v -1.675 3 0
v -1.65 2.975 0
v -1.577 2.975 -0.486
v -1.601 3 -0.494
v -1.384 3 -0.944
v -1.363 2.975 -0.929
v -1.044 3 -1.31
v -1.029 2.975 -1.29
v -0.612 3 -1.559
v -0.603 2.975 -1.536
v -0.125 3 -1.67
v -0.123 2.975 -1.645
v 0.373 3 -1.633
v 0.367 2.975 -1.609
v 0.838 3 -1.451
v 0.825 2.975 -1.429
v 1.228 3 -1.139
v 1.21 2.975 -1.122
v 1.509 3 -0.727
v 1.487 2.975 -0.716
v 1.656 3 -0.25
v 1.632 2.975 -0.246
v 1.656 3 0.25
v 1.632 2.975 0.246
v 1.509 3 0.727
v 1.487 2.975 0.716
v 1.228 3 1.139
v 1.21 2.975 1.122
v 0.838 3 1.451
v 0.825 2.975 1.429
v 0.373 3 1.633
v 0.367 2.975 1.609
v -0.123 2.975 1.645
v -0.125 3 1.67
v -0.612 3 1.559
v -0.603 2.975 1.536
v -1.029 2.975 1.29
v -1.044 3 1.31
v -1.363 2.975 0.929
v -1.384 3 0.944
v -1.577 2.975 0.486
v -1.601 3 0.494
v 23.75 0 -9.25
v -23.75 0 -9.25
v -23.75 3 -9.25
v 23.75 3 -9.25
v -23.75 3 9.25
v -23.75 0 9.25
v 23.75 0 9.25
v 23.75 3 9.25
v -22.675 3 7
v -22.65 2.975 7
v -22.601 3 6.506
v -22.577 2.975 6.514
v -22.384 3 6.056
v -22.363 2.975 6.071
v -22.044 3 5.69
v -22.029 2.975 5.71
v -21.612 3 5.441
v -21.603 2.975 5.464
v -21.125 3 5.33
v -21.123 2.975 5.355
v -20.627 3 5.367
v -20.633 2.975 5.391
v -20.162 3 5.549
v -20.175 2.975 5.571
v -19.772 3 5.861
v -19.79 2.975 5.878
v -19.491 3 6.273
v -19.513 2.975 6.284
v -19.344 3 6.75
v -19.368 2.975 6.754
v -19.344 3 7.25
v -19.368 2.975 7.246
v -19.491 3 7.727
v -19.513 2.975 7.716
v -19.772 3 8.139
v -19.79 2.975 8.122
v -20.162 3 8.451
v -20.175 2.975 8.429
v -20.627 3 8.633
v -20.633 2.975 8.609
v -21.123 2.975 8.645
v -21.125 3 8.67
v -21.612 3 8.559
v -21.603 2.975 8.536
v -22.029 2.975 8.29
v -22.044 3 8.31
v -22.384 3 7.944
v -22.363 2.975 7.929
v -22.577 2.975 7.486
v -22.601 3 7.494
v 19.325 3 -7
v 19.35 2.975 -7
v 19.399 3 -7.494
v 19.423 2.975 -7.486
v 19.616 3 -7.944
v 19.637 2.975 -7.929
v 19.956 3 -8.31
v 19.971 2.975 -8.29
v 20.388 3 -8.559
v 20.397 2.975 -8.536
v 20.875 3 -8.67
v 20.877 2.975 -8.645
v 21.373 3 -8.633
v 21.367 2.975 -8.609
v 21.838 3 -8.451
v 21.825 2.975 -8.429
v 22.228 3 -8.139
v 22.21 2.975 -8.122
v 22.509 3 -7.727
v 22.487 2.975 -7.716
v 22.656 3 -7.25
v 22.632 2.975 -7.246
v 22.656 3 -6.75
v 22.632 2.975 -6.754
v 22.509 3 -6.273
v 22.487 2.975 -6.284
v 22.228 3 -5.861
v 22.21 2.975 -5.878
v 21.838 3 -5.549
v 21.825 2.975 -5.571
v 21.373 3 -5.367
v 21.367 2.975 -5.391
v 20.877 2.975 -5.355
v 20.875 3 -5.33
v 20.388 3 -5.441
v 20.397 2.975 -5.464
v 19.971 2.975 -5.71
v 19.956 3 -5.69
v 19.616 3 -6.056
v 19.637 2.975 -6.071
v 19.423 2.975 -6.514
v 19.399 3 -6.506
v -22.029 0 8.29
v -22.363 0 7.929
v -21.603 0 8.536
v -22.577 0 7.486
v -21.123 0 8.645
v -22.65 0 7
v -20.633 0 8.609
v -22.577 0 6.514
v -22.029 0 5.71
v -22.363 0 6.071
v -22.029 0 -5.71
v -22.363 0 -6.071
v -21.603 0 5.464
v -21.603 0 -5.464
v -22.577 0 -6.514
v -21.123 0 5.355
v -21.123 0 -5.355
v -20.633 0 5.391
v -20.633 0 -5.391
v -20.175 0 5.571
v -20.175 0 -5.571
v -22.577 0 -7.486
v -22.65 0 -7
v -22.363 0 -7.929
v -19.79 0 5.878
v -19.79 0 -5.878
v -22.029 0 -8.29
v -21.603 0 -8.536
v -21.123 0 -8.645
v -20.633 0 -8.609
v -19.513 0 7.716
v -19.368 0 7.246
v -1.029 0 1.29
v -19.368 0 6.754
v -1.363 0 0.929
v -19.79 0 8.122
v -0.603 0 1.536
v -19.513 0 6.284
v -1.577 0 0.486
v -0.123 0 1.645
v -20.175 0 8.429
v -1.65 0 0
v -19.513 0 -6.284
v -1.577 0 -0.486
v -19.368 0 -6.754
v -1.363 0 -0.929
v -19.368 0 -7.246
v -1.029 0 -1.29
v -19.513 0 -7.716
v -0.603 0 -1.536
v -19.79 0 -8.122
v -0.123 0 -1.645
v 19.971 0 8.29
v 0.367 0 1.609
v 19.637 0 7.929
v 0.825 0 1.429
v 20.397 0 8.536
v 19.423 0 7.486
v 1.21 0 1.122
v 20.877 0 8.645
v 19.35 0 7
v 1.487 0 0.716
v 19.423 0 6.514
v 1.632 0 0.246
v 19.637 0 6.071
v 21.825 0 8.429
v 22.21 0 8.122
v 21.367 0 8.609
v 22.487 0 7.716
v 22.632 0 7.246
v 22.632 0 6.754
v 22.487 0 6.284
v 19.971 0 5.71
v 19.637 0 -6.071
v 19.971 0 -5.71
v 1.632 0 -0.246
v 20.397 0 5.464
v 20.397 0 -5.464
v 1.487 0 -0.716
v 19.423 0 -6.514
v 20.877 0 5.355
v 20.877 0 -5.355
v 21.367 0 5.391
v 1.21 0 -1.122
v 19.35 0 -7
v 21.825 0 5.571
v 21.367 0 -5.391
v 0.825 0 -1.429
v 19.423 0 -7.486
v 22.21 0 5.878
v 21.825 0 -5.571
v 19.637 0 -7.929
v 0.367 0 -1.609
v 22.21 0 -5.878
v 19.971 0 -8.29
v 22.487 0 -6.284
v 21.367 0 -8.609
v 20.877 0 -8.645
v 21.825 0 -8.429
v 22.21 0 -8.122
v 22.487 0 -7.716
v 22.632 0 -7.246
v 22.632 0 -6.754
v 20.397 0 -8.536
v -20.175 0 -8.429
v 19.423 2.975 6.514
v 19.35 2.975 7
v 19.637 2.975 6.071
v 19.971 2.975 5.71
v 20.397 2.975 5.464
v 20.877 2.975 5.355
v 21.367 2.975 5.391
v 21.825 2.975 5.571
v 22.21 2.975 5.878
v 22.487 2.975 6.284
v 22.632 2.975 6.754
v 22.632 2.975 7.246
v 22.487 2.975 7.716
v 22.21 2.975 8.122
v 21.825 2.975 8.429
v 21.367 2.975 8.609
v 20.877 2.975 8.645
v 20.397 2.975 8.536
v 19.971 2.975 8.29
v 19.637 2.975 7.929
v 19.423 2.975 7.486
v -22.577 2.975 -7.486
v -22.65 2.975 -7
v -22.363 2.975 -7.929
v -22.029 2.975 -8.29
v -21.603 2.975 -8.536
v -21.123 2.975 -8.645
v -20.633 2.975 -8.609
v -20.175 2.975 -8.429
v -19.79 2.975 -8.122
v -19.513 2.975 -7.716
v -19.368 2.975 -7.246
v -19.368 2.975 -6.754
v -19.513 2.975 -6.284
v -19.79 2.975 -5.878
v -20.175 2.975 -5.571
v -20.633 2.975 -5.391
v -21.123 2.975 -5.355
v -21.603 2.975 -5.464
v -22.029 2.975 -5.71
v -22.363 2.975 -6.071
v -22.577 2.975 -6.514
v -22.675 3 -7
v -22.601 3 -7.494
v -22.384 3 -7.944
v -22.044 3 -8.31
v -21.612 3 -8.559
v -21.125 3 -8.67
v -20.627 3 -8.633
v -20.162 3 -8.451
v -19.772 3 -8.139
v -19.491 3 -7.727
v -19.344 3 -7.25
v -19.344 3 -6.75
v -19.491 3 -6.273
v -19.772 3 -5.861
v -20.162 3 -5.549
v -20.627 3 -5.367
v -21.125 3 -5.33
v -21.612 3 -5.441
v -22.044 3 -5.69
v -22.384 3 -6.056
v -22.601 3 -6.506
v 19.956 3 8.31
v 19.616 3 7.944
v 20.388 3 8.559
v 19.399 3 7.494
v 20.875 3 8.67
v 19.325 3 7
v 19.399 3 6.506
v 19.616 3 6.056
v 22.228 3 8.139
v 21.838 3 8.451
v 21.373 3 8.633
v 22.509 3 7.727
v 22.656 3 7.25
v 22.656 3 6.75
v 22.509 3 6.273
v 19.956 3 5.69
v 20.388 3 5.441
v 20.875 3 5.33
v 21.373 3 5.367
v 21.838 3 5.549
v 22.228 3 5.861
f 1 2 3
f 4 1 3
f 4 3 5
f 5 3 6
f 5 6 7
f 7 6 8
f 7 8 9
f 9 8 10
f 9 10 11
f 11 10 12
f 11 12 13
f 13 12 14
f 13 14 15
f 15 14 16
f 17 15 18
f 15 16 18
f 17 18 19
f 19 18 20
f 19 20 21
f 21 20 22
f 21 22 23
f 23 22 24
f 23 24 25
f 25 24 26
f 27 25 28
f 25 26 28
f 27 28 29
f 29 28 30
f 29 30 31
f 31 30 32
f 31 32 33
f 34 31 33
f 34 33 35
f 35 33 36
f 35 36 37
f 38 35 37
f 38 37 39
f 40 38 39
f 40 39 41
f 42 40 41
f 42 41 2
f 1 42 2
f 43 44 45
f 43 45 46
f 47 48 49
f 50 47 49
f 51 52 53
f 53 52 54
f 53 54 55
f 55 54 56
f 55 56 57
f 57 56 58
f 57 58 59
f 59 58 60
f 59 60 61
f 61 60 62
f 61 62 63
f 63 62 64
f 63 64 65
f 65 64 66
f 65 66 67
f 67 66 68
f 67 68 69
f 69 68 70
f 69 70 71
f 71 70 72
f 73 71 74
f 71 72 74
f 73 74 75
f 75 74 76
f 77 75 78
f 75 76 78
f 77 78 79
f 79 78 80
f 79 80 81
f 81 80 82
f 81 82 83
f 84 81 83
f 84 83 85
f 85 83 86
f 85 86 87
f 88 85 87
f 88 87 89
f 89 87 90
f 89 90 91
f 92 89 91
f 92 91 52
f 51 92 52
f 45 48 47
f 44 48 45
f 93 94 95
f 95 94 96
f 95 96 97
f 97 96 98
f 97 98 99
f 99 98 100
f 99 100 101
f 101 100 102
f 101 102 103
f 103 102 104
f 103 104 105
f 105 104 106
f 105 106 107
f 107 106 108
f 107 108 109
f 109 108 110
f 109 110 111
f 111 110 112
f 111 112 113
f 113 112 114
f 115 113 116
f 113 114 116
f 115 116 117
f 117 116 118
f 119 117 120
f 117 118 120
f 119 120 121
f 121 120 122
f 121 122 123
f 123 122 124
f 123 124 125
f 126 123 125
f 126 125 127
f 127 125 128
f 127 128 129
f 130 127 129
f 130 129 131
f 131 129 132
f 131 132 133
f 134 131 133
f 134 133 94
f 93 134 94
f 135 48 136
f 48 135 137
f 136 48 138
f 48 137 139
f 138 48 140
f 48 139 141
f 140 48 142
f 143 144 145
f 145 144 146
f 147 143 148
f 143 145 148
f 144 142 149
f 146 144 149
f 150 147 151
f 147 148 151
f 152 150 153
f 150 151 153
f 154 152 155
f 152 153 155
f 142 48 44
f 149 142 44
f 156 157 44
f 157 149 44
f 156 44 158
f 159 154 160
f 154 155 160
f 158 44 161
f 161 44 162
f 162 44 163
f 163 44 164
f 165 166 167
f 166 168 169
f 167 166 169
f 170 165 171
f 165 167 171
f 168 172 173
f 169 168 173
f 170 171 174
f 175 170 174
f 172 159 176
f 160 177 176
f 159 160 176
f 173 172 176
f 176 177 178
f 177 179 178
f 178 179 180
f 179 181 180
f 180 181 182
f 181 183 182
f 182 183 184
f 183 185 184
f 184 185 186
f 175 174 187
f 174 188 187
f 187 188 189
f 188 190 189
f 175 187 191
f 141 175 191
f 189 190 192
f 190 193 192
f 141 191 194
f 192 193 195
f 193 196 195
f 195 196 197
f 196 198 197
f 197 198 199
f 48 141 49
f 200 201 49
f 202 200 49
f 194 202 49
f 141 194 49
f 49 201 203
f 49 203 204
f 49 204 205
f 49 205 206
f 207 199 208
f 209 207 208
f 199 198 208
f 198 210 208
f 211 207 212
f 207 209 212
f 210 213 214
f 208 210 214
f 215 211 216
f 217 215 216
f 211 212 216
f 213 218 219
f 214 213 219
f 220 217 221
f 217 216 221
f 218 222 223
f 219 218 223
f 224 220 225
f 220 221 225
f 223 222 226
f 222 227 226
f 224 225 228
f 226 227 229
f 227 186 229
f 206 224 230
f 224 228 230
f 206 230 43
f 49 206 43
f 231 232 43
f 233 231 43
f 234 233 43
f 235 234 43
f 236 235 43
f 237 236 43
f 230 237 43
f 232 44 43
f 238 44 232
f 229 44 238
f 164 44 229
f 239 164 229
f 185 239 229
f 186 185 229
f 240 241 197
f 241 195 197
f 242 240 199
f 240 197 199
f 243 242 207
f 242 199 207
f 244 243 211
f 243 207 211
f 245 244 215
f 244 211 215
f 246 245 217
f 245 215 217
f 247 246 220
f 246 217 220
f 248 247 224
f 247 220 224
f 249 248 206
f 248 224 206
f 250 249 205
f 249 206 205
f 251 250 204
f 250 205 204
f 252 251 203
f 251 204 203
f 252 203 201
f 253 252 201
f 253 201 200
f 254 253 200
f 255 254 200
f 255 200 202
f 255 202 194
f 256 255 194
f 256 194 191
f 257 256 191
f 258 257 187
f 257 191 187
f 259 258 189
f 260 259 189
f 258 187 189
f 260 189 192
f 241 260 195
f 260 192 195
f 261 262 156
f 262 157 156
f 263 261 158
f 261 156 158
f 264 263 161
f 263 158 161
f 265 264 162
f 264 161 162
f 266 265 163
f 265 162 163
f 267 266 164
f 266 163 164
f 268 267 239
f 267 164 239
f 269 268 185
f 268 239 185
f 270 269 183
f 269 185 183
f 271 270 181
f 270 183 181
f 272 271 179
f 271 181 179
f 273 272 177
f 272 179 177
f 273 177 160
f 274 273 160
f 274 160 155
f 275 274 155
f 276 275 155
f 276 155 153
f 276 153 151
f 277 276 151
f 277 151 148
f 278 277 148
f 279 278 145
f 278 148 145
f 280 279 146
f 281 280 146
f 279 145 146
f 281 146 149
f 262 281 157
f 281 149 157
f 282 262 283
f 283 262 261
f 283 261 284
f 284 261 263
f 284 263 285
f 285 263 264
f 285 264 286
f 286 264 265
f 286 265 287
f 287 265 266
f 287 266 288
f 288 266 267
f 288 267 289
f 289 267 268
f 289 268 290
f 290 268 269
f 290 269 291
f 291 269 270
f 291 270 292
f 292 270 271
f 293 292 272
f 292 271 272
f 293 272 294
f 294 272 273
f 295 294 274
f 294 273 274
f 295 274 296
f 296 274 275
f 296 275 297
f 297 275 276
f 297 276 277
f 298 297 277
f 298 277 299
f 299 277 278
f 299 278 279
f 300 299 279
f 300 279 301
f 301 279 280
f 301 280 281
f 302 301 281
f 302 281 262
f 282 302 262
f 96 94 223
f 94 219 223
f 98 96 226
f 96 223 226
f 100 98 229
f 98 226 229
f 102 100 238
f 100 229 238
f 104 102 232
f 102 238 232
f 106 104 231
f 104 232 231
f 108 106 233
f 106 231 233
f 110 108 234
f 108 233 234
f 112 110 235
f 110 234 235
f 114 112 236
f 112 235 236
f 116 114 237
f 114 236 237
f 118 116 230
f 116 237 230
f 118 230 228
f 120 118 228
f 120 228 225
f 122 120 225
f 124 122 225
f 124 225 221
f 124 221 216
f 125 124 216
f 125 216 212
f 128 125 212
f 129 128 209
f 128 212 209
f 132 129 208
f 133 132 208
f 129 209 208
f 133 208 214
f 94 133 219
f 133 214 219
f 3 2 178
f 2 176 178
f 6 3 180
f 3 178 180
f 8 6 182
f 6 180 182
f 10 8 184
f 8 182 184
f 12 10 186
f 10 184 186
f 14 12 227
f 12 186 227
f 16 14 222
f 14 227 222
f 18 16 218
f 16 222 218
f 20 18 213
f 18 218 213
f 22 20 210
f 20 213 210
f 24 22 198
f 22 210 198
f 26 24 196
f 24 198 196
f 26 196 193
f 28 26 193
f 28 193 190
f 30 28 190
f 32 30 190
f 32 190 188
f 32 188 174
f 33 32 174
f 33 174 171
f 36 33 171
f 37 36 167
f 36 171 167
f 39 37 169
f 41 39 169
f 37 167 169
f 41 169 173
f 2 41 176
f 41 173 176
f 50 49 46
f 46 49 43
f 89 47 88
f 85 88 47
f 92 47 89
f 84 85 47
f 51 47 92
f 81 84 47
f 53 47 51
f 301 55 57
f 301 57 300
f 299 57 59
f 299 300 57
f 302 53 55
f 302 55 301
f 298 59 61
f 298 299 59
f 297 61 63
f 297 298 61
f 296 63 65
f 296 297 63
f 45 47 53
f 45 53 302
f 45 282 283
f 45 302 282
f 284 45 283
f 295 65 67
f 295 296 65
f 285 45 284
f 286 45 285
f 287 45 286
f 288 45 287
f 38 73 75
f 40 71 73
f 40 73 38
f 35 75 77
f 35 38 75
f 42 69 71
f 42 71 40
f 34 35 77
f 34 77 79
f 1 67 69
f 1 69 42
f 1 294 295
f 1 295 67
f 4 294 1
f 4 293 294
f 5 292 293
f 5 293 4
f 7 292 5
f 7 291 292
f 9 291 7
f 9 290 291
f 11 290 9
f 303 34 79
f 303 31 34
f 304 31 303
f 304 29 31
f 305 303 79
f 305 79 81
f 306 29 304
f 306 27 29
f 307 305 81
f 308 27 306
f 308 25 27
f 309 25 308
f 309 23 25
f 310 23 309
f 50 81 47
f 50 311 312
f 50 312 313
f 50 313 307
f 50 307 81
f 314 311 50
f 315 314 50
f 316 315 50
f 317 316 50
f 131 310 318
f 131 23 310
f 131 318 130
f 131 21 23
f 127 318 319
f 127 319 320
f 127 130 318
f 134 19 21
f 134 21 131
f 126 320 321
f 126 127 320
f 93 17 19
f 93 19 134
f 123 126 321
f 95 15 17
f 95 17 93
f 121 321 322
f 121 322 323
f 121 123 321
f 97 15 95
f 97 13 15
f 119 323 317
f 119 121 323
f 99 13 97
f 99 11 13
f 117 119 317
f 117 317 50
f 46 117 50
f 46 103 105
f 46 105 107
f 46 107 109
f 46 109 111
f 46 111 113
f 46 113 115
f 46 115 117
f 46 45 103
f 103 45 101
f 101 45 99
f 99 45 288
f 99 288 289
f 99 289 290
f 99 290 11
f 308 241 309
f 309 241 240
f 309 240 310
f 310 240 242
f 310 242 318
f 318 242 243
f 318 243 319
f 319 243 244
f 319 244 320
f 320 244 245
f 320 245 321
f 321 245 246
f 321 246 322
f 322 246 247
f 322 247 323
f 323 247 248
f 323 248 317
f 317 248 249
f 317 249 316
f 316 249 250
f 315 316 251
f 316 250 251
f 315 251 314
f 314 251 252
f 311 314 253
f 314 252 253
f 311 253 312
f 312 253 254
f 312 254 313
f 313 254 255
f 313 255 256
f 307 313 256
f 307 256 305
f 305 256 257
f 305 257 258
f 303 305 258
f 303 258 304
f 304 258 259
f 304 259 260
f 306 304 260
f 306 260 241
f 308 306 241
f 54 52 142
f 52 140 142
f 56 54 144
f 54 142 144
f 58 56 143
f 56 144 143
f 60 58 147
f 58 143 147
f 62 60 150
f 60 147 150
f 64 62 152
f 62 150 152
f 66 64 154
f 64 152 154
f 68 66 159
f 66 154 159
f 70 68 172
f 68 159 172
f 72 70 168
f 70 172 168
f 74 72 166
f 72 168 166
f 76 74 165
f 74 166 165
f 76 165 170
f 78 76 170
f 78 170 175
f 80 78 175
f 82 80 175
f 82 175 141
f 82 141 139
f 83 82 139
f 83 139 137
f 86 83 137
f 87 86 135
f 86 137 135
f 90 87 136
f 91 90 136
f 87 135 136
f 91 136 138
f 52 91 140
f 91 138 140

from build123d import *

# Parameters (mm, degrees)
SKETCH1_W                            = 47.5
SKETCH1_H                            = 18.5
BOSS_EXTRUDE1_DEPTH                  = 3
F_3_3_3_3_DIAMETER_HOLE1_D           = 3.3
F_3_3_3_3_DIAMETER_HOLE1_CSINK_D     = 3.35
F_3_3_3_3_DIAMETER_HOLE1_CSINK_ANGLE = 90


with BuildPart() as part:
    # Sketch1 → Boss-Extrude1 (new body)
    with BuildSketch(Plane(origin=(0, 0, 0), x_dir=(1, 0, 0), z_dir=(0, 1, 0))):
        Rectangle(SKETCH1_W, SKETCH1_H)
    extrude(amount=BOSS_EXTRUDE1_DEPTH)

    # Ø3.3 (3.3) Diameter Hole1 (through all)
    with Locations(Plane(origin=(0, 3, 0), x_dir=(1, 0, 0), z_dir=(0, 1, 0))):
        with Locations((0, 0), (21, -7), (-21, 7), (-21, -7), (21, 7)):
            CounterSinkHole(F_3_3_3_3_DIAMETER_HOLE1_D / 2, F_3_3_3_3_DIAMETER_HOLE1_CSINK_D / 2, counter_sink_angle=F_3_3_3_3_DIAMETER_HOLE1_CSINK_ANGLE)


solid = part.part
